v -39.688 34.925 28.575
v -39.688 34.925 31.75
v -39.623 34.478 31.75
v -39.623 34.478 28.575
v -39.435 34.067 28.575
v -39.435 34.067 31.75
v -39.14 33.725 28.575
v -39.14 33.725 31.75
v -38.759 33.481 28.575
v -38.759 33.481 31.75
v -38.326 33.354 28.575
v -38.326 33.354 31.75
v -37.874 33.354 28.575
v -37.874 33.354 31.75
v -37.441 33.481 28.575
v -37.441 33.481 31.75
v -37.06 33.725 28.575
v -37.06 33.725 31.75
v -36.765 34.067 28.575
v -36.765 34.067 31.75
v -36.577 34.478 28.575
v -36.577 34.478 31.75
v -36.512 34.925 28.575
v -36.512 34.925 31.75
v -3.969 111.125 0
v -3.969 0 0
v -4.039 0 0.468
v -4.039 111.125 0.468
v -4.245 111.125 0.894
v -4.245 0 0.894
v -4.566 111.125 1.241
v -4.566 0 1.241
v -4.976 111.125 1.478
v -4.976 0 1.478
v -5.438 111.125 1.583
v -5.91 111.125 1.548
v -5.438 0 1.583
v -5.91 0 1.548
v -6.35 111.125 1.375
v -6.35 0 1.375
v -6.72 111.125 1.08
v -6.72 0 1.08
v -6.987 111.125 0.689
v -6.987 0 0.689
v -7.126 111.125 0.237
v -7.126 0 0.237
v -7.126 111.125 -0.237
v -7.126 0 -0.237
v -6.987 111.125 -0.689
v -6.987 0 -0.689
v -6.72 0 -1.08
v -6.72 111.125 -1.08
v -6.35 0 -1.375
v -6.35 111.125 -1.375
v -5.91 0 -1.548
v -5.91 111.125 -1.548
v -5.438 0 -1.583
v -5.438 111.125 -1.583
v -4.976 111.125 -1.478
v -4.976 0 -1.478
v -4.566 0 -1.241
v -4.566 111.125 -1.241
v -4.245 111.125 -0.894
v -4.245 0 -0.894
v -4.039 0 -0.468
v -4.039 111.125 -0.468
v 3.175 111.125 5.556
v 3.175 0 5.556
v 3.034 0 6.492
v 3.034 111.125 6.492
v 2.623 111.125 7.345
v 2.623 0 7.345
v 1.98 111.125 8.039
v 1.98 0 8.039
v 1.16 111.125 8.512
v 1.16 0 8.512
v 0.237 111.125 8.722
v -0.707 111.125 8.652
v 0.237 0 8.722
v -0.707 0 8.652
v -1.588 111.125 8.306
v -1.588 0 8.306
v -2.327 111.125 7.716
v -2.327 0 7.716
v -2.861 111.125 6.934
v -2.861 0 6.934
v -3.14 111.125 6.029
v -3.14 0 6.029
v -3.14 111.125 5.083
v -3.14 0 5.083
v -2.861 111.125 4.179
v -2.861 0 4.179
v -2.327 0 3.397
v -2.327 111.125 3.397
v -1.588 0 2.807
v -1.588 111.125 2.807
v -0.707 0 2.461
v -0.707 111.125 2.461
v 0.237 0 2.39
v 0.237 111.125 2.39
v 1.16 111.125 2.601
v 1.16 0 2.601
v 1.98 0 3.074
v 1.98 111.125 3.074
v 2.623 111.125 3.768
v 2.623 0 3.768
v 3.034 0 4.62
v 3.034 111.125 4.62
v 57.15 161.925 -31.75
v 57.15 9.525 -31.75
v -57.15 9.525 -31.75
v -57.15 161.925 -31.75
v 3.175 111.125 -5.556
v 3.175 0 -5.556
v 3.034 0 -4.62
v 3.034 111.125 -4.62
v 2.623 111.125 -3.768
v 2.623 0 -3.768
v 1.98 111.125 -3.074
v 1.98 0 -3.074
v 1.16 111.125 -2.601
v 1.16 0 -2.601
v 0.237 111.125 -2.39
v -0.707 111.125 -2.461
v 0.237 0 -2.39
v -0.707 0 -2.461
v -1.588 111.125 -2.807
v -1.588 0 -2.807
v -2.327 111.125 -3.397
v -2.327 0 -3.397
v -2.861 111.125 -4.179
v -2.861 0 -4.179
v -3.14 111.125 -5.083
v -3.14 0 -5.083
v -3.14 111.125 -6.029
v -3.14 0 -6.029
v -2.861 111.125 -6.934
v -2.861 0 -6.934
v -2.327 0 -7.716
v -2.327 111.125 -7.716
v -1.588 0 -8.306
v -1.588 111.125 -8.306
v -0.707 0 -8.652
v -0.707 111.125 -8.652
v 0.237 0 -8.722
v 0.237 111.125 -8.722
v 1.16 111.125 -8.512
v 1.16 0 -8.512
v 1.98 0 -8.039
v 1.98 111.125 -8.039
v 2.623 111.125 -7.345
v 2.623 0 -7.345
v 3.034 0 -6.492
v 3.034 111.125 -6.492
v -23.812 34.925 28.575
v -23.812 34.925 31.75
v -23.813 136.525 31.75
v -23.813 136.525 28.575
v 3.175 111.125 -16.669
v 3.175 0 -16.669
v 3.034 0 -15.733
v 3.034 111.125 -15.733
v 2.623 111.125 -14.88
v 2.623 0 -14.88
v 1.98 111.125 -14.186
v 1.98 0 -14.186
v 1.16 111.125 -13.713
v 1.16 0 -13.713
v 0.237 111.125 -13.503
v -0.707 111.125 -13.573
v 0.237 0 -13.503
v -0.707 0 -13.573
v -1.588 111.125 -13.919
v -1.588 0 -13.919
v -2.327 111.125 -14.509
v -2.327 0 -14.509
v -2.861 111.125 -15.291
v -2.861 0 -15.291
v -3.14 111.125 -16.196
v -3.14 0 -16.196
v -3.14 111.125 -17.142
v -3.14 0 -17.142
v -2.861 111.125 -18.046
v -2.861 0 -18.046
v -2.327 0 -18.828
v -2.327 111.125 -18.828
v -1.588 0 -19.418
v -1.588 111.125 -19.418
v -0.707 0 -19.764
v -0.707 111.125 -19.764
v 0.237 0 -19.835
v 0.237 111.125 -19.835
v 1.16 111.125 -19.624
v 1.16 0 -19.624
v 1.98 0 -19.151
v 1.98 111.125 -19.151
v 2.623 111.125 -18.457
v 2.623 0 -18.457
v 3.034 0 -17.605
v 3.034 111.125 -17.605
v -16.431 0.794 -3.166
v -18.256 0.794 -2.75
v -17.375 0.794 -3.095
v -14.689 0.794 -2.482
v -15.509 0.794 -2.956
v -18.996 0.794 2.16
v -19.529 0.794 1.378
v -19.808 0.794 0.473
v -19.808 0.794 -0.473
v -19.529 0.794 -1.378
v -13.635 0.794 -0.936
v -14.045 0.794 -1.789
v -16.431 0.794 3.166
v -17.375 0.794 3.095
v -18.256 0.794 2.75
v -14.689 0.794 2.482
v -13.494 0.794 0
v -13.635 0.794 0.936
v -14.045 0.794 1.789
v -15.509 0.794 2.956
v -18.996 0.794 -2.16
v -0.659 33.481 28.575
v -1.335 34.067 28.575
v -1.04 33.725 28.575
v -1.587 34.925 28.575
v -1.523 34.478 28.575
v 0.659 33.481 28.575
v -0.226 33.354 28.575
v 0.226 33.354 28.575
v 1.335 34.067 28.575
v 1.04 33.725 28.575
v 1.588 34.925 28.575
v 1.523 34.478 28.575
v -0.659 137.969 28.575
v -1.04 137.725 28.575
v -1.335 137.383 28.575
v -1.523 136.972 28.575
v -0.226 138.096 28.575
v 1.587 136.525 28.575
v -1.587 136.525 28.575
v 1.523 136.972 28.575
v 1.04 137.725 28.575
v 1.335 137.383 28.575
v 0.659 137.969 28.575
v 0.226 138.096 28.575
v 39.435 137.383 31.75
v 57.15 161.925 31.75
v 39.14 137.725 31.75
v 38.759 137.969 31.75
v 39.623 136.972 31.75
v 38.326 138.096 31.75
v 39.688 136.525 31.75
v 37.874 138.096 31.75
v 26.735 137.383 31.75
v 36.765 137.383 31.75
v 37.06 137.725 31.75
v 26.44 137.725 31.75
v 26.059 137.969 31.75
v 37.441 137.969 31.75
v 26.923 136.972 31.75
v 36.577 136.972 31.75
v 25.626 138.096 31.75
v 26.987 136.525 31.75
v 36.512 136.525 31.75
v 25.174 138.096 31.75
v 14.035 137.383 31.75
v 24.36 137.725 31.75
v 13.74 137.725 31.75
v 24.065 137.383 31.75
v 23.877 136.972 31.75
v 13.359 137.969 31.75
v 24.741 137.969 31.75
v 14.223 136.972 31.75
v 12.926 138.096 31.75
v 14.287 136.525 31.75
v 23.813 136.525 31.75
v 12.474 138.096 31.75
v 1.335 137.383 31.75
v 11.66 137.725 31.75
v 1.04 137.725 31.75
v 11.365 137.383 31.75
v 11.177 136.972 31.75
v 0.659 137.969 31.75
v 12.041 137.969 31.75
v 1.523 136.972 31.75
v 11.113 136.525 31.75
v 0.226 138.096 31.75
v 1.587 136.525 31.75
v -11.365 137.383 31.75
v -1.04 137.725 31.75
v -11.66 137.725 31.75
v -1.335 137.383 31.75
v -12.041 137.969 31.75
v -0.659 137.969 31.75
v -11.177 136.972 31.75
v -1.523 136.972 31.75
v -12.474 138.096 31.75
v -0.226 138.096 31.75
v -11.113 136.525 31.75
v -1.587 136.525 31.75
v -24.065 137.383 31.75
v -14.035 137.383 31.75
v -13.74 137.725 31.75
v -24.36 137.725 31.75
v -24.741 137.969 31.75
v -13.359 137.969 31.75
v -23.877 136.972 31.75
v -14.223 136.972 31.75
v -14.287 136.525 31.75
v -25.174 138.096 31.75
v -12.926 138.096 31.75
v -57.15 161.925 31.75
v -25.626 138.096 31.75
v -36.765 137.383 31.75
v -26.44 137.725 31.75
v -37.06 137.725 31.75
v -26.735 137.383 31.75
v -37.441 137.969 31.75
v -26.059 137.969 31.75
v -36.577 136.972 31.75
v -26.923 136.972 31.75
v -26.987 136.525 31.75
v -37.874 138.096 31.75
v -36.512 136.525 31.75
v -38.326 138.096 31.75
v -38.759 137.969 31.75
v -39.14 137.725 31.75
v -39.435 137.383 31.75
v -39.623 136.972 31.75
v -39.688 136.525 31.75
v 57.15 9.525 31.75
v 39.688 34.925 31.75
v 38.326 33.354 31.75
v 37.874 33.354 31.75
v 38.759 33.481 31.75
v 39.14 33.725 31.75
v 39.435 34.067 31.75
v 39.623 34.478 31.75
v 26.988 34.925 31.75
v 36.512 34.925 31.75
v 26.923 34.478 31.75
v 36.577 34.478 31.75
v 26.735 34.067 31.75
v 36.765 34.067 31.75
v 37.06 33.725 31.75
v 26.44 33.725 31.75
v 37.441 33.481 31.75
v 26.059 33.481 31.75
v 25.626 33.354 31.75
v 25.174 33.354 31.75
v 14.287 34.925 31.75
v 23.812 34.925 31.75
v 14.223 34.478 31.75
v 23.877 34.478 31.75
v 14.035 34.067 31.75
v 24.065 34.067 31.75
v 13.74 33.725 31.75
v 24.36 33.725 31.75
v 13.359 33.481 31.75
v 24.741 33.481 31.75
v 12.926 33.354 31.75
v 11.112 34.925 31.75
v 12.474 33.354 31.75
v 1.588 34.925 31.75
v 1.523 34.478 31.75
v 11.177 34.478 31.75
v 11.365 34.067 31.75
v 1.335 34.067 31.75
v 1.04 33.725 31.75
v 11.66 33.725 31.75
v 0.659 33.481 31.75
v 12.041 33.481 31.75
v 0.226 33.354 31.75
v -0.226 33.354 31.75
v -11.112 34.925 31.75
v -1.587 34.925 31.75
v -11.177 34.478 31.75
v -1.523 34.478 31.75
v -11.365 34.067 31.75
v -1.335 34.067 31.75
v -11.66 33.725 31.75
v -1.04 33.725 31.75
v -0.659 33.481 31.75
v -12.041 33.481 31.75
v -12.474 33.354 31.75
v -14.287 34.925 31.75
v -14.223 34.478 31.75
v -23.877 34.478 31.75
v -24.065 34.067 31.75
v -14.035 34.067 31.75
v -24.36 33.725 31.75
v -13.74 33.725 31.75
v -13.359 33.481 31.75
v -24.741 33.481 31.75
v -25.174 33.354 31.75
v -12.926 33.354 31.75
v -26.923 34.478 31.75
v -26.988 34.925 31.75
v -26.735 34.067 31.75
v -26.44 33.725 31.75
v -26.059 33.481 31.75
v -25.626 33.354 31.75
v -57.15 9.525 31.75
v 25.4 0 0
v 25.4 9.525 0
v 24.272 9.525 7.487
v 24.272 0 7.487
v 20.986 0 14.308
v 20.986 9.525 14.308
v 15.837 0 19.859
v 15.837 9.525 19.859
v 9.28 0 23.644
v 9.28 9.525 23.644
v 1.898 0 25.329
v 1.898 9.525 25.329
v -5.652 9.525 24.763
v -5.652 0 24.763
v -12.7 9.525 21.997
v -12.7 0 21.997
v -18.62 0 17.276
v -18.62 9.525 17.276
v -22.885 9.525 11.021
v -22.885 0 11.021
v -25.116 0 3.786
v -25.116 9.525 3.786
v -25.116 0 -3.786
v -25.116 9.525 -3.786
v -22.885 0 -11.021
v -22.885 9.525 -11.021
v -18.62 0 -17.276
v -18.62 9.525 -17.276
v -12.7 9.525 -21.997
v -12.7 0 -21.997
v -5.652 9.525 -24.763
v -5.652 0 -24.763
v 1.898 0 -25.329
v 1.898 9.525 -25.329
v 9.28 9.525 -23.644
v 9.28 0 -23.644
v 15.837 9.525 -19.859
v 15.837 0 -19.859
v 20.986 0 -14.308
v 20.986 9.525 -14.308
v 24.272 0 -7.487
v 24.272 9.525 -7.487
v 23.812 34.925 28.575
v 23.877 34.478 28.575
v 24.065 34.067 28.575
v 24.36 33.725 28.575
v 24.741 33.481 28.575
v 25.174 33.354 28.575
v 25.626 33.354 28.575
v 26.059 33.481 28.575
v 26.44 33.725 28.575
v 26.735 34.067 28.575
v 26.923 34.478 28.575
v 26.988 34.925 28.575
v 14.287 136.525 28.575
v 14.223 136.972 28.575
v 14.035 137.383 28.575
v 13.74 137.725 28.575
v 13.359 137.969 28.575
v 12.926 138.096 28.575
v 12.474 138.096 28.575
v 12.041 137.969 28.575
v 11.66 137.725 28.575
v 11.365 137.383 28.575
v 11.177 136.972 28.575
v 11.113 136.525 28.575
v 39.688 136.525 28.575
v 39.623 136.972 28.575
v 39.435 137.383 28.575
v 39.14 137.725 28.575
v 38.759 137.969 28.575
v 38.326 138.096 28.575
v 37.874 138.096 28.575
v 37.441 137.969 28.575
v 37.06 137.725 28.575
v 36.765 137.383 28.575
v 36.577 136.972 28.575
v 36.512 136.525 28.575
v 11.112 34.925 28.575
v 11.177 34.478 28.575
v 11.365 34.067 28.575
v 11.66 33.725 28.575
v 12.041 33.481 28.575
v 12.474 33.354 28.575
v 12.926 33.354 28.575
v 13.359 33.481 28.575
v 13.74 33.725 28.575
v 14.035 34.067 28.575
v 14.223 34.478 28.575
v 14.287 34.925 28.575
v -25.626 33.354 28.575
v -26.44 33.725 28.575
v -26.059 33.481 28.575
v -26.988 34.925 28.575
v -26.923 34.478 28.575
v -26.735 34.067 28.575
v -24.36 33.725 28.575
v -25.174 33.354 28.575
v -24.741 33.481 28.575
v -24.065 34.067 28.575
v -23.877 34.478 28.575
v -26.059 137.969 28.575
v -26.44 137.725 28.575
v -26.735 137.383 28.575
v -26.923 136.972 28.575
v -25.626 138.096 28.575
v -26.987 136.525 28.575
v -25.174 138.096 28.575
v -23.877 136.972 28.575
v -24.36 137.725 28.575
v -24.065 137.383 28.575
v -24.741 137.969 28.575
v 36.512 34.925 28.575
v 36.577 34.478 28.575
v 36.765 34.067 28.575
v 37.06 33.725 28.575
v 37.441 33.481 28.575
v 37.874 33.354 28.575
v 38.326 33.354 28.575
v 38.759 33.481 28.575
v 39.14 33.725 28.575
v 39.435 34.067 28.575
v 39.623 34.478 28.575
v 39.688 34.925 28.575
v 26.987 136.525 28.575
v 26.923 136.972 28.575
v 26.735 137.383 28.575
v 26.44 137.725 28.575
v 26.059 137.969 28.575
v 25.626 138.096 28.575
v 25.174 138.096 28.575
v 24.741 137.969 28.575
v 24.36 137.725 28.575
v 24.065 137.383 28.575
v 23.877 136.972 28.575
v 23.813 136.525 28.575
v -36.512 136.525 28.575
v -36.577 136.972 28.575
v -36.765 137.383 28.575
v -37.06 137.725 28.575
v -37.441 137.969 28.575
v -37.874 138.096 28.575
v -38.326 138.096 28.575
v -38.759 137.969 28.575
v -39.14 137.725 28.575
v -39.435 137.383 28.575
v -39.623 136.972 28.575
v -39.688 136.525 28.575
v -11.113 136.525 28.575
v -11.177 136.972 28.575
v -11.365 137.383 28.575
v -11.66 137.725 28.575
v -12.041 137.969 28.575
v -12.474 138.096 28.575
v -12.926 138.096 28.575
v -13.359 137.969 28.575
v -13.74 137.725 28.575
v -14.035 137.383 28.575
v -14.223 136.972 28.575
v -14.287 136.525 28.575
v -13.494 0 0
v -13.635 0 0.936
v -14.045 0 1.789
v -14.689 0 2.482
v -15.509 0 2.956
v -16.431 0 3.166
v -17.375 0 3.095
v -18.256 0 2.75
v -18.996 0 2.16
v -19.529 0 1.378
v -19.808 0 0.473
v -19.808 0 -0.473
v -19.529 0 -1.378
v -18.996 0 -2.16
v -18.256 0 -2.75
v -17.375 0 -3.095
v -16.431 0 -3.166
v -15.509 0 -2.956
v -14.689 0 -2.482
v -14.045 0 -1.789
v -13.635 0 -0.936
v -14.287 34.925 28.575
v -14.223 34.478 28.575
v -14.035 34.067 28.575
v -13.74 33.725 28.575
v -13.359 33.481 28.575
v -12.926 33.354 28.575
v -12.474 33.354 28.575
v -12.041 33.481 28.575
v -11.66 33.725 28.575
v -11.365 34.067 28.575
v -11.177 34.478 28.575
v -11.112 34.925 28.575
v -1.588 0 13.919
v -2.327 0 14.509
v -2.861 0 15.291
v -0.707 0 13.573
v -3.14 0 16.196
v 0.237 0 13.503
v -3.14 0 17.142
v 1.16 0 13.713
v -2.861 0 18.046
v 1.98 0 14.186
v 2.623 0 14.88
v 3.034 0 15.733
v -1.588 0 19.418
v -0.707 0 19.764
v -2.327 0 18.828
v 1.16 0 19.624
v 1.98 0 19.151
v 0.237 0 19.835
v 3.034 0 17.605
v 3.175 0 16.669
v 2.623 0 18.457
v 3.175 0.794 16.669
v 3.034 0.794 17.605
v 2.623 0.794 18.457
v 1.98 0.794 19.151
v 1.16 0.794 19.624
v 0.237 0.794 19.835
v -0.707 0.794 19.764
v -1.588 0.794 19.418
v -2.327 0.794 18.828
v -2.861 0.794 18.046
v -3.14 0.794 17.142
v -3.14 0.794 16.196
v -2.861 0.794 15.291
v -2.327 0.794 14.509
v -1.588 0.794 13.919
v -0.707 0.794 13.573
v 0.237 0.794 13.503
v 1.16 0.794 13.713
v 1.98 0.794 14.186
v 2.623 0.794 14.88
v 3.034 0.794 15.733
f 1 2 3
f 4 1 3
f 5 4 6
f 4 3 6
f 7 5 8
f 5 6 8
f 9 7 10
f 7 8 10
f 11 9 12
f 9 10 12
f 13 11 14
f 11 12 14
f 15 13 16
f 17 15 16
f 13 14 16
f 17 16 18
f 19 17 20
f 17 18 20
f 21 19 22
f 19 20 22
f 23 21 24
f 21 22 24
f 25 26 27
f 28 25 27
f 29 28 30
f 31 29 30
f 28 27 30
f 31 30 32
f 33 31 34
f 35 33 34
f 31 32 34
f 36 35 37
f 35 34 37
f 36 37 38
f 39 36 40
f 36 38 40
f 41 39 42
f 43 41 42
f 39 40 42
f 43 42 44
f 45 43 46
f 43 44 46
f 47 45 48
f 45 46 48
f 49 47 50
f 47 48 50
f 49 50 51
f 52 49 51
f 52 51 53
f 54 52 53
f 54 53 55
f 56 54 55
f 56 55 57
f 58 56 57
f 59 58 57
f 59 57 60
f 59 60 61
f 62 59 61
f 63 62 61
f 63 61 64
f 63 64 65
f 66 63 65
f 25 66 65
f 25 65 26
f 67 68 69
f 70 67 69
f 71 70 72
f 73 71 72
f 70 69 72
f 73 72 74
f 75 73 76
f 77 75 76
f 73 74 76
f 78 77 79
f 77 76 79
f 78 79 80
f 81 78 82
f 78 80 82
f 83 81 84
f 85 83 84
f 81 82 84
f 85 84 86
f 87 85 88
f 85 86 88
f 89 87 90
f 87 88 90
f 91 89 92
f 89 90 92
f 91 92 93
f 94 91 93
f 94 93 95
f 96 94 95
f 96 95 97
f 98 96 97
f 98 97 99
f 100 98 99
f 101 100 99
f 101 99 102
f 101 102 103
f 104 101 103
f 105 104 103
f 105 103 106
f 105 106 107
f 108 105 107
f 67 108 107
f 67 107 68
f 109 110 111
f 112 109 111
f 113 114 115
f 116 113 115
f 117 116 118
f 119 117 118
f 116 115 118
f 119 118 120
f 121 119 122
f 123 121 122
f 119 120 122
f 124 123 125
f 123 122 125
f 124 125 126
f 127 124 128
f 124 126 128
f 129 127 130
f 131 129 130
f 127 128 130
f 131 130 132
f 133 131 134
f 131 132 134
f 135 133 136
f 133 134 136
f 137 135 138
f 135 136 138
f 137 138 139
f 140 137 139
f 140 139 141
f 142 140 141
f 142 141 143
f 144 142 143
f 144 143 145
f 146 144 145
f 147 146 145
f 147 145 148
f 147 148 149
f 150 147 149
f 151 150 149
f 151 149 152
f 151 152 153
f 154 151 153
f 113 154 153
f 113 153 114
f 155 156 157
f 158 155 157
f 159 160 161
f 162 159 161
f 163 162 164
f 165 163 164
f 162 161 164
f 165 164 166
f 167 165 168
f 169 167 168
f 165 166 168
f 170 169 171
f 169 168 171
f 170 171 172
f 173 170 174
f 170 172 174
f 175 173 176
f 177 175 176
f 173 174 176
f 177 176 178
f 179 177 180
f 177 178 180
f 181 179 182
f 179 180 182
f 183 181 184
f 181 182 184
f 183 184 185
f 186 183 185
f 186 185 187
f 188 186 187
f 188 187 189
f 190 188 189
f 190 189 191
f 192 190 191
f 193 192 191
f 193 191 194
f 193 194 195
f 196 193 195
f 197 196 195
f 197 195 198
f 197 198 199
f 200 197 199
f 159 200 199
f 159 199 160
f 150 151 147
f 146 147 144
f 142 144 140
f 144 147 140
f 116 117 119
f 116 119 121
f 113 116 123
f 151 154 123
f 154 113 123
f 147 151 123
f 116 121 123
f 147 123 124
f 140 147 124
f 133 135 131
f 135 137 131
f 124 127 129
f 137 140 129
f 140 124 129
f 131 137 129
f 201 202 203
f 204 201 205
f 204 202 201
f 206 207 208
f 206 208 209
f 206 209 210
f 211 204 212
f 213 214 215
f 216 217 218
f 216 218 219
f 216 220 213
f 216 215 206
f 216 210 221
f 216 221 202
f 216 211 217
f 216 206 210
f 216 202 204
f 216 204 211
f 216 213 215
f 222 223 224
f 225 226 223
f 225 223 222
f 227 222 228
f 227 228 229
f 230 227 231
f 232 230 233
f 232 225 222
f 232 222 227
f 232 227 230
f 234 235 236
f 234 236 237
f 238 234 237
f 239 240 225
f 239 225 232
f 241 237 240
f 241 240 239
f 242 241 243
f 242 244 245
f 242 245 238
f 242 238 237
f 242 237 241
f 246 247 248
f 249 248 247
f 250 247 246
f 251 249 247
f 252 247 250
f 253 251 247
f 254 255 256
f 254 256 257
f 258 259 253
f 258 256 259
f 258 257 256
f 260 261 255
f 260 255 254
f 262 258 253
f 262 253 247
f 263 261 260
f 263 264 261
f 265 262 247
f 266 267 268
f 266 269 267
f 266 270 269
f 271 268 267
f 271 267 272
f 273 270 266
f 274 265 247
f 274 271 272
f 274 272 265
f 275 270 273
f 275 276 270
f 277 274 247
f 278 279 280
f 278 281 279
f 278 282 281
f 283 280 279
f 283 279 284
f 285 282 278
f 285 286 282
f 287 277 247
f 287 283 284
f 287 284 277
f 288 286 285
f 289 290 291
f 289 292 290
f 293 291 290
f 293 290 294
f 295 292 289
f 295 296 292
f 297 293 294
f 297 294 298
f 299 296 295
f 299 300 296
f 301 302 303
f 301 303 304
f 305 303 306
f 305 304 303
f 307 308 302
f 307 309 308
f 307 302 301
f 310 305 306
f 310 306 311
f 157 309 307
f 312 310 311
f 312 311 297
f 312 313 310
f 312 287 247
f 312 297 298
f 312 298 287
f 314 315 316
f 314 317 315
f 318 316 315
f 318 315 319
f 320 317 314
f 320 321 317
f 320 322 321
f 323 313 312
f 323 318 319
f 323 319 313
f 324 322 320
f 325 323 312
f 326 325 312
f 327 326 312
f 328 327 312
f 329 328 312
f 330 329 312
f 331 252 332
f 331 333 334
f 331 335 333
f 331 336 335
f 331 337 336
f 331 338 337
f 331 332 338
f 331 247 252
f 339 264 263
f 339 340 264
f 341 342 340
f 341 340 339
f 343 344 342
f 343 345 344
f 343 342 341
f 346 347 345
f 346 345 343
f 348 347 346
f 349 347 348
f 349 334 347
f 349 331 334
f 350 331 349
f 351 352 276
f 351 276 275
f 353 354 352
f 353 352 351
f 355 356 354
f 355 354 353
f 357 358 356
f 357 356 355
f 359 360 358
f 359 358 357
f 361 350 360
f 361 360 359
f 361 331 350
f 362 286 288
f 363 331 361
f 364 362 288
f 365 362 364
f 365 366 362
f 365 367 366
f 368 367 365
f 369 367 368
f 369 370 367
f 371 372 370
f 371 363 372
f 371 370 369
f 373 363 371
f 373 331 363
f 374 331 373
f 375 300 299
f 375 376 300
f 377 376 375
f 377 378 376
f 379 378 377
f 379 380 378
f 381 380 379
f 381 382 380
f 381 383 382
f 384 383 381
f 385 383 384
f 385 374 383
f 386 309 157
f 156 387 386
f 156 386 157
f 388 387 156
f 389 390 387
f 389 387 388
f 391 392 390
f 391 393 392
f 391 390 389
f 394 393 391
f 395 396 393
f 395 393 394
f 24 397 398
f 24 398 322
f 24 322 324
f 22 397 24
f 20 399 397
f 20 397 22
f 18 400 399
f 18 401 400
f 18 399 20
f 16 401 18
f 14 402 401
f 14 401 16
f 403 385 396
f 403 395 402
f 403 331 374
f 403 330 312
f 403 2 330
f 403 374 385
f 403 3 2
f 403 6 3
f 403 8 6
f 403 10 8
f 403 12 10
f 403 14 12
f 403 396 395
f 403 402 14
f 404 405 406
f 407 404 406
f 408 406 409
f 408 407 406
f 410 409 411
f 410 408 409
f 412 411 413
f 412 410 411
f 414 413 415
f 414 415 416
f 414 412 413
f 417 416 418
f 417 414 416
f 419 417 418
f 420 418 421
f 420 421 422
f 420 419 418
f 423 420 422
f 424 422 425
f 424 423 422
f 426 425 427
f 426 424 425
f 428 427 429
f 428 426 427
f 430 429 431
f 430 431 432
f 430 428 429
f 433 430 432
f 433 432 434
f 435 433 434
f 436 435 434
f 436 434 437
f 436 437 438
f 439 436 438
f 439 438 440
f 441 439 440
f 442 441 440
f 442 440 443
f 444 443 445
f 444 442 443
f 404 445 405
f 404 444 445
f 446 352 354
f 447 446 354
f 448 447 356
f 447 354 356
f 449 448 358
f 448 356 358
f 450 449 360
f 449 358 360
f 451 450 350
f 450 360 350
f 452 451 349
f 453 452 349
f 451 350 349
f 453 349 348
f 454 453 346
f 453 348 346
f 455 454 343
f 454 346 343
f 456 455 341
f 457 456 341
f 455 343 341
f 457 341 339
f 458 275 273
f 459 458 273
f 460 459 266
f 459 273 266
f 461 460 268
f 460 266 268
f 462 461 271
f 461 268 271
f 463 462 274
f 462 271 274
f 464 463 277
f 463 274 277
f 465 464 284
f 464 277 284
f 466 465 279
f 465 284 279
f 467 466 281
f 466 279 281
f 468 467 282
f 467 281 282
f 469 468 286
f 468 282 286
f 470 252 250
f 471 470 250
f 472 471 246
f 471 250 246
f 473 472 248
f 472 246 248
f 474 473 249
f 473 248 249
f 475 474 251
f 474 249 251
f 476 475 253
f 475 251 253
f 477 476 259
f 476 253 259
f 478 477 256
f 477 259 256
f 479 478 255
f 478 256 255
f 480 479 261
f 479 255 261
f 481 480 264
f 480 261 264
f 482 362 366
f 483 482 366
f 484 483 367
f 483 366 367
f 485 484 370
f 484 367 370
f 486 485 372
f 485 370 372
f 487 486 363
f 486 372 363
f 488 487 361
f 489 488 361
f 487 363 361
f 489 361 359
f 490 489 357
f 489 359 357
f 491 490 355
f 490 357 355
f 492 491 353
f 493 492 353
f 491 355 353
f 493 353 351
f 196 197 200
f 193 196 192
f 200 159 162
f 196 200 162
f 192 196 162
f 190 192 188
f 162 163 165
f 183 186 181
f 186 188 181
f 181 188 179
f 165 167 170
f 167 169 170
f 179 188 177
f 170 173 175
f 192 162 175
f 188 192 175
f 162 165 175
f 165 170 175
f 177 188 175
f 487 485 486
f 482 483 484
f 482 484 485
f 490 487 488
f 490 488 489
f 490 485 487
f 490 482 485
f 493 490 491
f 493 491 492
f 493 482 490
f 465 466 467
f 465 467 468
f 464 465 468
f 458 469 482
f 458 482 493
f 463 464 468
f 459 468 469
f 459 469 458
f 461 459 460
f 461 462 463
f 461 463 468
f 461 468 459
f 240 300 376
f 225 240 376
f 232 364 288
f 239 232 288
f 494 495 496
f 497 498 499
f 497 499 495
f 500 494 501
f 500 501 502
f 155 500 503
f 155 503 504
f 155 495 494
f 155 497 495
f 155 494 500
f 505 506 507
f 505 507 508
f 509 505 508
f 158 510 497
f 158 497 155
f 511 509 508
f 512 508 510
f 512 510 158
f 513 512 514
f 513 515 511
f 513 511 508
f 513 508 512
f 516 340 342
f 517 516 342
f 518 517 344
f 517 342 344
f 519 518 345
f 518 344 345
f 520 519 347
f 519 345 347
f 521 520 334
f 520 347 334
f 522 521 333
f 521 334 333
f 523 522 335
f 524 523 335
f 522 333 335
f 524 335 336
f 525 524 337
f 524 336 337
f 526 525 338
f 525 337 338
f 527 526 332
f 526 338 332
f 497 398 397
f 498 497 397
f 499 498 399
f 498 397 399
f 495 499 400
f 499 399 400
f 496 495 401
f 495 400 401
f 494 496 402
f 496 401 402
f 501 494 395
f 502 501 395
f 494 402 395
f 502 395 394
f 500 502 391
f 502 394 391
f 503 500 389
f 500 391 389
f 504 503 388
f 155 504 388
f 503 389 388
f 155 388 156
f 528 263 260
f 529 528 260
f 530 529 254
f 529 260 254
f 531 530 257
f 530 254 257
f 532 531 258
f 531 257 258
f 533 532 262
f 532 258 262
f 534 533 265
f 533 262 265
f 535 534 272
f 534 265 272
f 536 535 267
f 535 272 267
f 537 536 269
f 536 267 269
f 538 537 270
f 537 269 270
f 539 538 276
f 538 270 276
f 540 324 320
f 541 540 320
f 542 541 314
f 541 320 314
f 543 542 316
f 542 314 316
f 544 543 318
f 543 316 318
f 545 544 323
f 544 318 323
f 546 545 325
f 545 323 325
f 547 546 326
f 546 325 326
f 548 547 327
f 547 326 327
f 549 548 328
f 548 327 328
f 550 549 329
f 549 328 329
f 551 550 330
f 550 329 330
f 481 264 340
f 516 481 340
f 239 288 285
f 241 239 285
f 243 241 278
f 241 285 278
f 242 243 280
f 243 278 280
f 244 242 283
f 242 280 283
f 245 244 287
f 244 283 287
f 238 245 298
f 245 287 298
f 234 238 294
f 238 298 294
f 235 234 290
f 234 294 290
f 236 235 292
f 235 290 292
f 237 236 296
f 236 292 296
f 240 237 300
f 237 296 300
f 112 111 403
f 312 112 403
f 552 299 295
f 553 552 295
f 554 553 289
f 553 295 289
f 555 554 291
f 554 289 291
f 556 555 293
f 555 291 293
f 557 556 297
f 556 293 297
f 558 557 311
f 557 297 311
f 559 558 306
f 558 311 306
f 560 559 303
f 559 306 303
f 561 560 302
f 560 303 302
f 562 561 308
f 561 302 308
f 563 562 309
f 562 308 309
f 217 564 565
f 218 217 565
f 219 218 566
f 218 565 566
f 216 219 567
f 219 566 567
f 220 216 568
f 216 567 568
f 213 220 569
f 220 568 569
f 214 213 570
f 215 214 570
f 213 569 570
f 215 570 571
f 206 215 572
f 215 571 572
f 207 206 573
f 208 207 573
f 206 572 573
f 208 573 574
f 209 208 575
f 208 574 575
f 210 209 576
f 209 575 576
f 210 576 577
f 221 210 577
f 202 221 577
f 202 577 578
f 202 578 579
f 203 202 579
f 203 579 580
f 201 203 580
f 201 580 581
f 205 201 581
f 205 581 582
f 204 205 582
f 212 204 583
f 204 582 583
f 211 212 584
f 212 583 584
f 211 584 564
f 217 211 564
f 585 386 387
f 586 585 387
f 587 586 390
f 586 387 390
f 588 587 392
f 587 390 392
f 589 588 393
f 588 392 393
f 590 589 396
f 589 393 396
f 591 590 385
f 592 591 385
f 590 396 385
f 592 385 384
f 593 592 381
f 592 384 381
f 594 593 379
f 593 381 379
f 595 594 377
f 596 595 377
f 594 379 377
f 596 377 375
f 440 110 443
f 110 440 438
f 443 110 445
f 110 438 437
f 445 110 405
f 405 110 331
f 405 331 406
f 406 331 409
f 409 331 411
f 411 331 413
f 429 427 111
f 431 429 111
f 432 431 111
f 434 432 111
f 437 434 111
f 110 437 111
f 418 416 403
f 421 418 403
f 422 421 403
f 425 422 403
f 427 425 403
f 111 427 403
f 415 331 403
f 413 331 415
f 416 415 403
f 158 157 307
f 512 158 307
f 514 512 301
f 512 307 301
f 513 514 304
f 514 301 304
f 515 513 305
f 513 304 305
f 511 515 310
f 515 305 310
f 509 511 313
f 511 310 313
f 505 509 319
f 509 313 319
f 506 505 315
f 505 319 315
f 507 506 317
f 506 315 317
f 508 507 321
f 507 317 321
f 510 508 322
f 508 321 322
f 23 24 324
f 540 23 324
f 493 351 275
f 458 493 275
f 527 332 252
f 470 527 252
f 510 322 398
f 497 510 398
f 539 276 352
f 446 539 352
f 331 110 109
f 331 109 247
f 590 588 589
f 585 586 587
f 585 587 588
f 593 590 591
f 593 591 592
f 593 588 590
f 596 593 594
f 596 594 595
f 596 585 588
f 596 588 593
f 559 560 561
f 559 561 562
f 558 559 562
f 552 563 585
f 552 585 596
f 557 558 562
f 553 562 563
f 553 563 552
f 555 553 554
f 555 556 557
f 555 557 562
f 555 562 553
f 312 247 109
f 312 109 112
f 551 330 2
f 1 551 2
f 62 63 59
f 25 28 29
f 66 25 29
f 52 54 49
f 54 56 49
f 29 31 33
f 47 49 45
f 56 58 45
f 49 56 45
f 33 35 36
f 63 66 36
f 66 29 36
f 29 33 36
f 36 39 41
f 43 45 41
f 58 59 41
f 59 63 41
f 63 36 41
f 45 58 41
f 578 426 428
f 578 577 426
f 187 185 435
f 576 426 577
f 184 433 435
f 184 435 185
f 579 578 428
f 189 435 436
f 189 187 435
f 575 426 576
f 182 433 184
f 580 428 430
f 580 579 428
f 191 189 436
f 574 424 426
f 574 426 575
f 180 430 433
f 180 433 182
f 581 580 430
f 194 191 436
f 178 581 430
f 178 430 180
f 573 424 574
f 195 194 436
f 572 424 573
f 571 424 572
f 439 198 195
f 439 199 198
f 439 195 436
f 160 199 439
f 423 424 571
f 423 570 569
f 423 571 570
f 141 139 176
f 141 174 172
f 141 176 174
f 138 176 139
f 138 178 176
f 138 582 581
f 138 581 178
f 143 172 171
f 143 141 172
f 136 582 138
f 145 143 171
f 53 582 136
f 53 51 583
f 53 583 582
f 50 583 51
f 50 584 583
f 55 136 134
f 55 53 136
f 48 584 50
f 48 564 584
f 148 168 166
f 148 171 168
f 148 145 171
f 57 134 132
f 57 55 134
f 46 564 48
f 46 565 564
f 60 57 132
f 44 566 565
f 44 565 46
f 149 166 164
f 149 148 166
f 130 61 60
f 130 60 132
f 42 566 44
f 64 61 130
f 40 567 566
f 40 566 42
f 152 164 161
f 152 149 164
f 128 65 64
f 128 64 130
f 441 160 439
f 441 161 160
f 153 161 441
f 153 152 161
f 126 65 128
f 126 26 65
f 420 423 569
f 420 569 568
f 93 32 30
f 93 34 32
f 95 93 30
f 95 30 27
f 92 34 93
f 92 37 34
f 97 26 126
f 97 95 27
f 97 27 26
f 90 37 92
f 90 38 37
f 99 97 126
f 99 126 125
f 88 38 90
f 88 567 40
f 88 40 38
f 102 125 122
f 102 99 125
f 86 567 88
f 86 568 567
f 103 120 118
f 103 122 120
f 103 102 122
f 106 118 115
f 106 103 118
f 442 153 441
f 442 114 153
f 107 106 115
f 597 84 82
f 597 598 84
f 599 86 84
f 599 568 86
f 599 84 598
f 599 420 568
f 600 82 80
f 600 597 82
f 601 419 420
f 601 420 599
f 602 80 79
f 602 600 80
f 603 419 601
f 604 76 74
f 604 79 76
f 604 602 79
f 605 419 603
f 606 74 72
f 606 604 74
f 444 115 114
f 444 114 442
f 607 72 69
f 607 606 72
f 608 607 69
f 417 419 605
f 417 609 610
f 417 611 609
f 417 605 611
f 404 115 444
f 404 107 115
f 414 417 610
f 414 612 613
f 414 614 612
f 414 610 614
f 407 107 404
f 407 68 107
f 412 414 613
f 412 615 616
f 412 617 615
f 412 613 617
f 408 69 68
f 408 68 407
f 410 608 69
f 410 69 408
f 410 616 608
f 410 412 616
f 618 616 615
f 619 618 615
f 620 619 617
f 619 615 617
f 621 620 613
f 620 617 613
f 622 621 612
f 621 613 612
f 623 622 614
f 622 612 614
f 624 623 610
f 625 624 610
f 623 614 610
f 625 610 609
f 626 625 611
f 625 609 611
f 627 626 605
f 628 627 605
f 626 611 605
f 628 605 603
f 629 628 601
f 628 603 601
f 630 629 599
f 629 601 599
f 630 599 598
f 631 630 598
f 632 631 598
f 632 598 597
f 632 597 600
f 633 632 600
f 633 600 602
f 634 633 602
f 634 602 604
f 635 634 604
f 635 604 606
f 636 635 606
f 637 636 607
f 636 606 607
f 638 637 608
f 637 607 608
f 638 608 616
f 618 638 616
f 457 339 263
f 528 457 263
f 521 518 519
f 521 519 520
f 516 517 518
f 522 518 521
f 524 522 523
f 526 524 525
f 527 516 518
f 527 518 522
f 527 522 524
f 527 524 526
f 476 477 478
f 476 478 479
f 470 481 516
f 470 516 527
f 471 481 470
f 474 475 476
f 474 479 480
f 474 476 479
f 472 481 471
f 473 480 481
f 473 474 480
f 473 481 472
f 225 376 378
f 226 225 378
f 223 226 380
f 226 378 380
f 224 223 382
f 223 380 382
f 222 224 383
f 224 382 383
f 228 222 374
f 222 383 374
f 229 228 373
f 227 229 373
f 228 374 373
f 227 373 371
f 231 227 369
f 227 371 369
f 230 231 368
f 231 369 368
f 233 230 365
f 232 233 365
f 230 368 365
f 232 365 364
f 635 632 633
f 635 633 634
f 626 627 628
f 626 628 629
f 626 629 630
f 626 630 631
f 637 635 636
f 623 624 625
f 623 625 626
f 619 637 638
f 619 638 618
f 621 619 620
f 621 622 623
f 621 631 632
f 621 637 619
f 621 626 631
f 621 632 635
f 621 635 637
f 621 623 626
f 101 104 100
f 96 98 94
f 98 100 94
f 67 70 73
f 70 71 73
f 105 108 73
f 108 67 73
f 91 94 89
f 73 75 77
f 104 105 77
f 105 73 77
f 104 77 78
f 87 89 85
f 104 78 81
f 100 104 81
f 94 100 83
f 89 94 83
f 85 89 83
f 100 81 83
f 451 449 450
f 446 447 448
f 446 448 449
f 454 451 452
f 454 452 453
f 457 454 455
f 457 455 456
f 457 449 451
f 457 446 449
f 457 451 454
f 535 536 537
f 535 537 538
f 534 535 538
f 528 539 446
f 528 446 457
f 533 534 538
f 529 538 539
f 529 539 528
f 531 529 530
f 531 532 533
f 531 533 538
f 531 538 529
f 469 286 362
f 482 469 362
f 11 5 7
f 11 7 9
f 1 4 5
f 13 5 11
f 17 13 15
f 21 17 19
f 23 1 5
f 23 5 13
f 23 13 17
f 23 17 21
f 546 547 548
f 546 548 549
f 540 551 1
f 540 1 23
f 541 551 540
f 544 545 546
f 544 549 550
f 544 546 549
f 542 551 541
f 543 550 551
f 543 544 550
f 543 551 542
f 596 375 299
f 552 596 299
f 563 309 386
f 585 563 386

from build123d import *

# Parameters (mm, degrees)
F0_R     = 25.4
F0_R_2   = 3.175
F0_R_3   = 1.5875
F1_DEPTH = 9.525
F2_W     = 114.3
F2_H     = 63.5
F3_DEPTH = 152.4
F5_DEPTH = 3.175
F6_DEPTH = 0.79375
F7_DEPTH = 101.6


with BuildPart() as f1:
    # F0 (on Front) → F1 (new body)
    with BuildSketch(Plane.XZ):
        Circle(F0_R)
        with Locations((0, -16.66875)):
            Circle(F0_R_2, mode=Mode.SUBTRACT)
        with Locations((-16.66875, 0)):
            Circle(F0_R_2, mode=Mode.SUBTRACT)
        with Locations((0, -5.55625)):
            Circle(F0_R_2, mode=Mode.SUBTRACT)
        with Locations((-5.55625, 0)):
            Circle(F0_R_3, mode=Mode.SUBTRACT)
        with Locations((0, 5.55625)):
            Circle(F0_R_2, mode=Mode.SUBTRACT)
        with Locations((0, 16.66875)):
            Circle(F0_R_2, mode=Mode.SUBTRACT)
        with Locations((-16.66875, 0)):
            Circle(F0_R_2)
        with Locations((0, 16.66875)):
            Circle(F0_R_2)
    extrude(amount=-F1_DEPTH)

    # F2 (on face) → F3 (join)
    with BuildSketch(Plane(origin=(0, 9.525, 0), x_dir=(-1, 0, 0), z_dir=(0, 1, 0))):
        Rectangle(F2_W, F2_H)
    extrude(amount=F3_DEPTH)

    # F4 (on face) → F5 (cut)
    with BuildSketch(Plane.XY.offset(31.75)):
        with BuildLine():
            ThreePointArc((-1.5875, 34.925), (0, 33.3375), (1.5875, 34.925))
            Line((1.5875, 34.925), (1.5875, 136.525))
            ThreePointArc((1.5875, 136.525), (0, 138.1125), (-1.5875, 136.525))
            Line((-1.5875, 136.525), (-1.5875, 34.925))
        make_face()
        with BuildLine():
            Line((11.1125, 136.525), (11.1125, 34.925))
            ThreePointArc((11.1125, 34.925), (12.7, 33.3375), (14.2875, 34.925))
            Line((14.2875, 34.925), (14.2875, 136.525))
            ThreePointArc((14.2875, 136.525), (12.7, 138.1125), (11.1125, 136.525))
        make_face()
        with BuildLine():
            Line((23.8125, 136.525), (23.8125, 34.925))
            ThreePointArc((23.8125, 34.925), (25.4, 33.3375), (26.9875, 34.925))
            Line((26.9875, 34.925), (26.9875, 136.525))
            ThreePointArc((26.9875, 136.525), (25.4, 138.1125), (23.8125, 136.525))
        make_face()
        with BuildLine():
            Line((36.5125, 136.525), (36.5125, 34.925))
            ThreePointArc((36.5125, 34.925), (38.1, 33.3375), (39.6875, 34.925))
            Line((39.6875, 34.925), (39.6875, 136.525))
            ThreePointArc((39.6875, 136.525), (38.1, 138.1125), (36.5125, 136.525))
        make_face()
        with BuildLine():
            Line((-23.8125, 34.925), (-23.8125, 136.525))
            ThreePointArc((-23.8125, 136.525), (-25.4, 138.1125), (-26.9875, 136.525))
            Line((-26.9875, 136.525), (-26.9875, 34.925))
            ThreePointArc((-26.9875, 34.925), (-25.4, 33.3375), (-23.8125, 34.925))
        make_face()
        with BuildLine():
            Line((-11.1125, 34.925), (-11.1125, 136.525))
            ThreePointArc((-11.1125, 136.525), (-12.7, 138.1125), (-14.2875, 136.525))
            Line((-14.2875, 136.525), (-14.2875, 34.925))
            ThreePointArc((-14.2875, 34.925), (-12.7, 33.3375), (-11.1125, 34.925))
        make_face()
        with BuildLine():
            Line((-39.6875, 136.525), (-39.6875, 34.925))
            ThreePointArc((-39.6875, 34.925), (-38.1, 33.3375), (-36.5125, 34.925))
            Line((-36.5125, 34.925), (-36.5125, 136.525))
            ThreePointArc((-36.5125, 136.525), (-38.1, 138.1125), (-39.6875, 136.525))
        make_face()
    extrude(amount=-F5_DEPTH, mode=Mode.SUBTRACT)

    # F0 (on Front) → F6 (cut)
    with BuildSketch(Plane.XZ):
        with Locations((0, 16.66875)):
            Circle(F0_R_2)
        with Locations((-16.66875, 0)):
            Circle(F0_R_2)
    extrude(amount=-F6_DEPTH, mode=Mode.SUBTRACT)

    # F7 (cut): faces of the model
    f7_faces = [f1.faces().sort_by_distance(p)[0] for p in [
        (0, 9.525, 5.55625),
        (-5.55625, 9.525, 0),
        (0, 9.525, -5.55625),
        (0, 9.525, -16.66875),
    ]]
    extrude(f7_faces, amount=-F7_DEPTH, mode=Mode.SUBTRACT)


solid = f1.part
